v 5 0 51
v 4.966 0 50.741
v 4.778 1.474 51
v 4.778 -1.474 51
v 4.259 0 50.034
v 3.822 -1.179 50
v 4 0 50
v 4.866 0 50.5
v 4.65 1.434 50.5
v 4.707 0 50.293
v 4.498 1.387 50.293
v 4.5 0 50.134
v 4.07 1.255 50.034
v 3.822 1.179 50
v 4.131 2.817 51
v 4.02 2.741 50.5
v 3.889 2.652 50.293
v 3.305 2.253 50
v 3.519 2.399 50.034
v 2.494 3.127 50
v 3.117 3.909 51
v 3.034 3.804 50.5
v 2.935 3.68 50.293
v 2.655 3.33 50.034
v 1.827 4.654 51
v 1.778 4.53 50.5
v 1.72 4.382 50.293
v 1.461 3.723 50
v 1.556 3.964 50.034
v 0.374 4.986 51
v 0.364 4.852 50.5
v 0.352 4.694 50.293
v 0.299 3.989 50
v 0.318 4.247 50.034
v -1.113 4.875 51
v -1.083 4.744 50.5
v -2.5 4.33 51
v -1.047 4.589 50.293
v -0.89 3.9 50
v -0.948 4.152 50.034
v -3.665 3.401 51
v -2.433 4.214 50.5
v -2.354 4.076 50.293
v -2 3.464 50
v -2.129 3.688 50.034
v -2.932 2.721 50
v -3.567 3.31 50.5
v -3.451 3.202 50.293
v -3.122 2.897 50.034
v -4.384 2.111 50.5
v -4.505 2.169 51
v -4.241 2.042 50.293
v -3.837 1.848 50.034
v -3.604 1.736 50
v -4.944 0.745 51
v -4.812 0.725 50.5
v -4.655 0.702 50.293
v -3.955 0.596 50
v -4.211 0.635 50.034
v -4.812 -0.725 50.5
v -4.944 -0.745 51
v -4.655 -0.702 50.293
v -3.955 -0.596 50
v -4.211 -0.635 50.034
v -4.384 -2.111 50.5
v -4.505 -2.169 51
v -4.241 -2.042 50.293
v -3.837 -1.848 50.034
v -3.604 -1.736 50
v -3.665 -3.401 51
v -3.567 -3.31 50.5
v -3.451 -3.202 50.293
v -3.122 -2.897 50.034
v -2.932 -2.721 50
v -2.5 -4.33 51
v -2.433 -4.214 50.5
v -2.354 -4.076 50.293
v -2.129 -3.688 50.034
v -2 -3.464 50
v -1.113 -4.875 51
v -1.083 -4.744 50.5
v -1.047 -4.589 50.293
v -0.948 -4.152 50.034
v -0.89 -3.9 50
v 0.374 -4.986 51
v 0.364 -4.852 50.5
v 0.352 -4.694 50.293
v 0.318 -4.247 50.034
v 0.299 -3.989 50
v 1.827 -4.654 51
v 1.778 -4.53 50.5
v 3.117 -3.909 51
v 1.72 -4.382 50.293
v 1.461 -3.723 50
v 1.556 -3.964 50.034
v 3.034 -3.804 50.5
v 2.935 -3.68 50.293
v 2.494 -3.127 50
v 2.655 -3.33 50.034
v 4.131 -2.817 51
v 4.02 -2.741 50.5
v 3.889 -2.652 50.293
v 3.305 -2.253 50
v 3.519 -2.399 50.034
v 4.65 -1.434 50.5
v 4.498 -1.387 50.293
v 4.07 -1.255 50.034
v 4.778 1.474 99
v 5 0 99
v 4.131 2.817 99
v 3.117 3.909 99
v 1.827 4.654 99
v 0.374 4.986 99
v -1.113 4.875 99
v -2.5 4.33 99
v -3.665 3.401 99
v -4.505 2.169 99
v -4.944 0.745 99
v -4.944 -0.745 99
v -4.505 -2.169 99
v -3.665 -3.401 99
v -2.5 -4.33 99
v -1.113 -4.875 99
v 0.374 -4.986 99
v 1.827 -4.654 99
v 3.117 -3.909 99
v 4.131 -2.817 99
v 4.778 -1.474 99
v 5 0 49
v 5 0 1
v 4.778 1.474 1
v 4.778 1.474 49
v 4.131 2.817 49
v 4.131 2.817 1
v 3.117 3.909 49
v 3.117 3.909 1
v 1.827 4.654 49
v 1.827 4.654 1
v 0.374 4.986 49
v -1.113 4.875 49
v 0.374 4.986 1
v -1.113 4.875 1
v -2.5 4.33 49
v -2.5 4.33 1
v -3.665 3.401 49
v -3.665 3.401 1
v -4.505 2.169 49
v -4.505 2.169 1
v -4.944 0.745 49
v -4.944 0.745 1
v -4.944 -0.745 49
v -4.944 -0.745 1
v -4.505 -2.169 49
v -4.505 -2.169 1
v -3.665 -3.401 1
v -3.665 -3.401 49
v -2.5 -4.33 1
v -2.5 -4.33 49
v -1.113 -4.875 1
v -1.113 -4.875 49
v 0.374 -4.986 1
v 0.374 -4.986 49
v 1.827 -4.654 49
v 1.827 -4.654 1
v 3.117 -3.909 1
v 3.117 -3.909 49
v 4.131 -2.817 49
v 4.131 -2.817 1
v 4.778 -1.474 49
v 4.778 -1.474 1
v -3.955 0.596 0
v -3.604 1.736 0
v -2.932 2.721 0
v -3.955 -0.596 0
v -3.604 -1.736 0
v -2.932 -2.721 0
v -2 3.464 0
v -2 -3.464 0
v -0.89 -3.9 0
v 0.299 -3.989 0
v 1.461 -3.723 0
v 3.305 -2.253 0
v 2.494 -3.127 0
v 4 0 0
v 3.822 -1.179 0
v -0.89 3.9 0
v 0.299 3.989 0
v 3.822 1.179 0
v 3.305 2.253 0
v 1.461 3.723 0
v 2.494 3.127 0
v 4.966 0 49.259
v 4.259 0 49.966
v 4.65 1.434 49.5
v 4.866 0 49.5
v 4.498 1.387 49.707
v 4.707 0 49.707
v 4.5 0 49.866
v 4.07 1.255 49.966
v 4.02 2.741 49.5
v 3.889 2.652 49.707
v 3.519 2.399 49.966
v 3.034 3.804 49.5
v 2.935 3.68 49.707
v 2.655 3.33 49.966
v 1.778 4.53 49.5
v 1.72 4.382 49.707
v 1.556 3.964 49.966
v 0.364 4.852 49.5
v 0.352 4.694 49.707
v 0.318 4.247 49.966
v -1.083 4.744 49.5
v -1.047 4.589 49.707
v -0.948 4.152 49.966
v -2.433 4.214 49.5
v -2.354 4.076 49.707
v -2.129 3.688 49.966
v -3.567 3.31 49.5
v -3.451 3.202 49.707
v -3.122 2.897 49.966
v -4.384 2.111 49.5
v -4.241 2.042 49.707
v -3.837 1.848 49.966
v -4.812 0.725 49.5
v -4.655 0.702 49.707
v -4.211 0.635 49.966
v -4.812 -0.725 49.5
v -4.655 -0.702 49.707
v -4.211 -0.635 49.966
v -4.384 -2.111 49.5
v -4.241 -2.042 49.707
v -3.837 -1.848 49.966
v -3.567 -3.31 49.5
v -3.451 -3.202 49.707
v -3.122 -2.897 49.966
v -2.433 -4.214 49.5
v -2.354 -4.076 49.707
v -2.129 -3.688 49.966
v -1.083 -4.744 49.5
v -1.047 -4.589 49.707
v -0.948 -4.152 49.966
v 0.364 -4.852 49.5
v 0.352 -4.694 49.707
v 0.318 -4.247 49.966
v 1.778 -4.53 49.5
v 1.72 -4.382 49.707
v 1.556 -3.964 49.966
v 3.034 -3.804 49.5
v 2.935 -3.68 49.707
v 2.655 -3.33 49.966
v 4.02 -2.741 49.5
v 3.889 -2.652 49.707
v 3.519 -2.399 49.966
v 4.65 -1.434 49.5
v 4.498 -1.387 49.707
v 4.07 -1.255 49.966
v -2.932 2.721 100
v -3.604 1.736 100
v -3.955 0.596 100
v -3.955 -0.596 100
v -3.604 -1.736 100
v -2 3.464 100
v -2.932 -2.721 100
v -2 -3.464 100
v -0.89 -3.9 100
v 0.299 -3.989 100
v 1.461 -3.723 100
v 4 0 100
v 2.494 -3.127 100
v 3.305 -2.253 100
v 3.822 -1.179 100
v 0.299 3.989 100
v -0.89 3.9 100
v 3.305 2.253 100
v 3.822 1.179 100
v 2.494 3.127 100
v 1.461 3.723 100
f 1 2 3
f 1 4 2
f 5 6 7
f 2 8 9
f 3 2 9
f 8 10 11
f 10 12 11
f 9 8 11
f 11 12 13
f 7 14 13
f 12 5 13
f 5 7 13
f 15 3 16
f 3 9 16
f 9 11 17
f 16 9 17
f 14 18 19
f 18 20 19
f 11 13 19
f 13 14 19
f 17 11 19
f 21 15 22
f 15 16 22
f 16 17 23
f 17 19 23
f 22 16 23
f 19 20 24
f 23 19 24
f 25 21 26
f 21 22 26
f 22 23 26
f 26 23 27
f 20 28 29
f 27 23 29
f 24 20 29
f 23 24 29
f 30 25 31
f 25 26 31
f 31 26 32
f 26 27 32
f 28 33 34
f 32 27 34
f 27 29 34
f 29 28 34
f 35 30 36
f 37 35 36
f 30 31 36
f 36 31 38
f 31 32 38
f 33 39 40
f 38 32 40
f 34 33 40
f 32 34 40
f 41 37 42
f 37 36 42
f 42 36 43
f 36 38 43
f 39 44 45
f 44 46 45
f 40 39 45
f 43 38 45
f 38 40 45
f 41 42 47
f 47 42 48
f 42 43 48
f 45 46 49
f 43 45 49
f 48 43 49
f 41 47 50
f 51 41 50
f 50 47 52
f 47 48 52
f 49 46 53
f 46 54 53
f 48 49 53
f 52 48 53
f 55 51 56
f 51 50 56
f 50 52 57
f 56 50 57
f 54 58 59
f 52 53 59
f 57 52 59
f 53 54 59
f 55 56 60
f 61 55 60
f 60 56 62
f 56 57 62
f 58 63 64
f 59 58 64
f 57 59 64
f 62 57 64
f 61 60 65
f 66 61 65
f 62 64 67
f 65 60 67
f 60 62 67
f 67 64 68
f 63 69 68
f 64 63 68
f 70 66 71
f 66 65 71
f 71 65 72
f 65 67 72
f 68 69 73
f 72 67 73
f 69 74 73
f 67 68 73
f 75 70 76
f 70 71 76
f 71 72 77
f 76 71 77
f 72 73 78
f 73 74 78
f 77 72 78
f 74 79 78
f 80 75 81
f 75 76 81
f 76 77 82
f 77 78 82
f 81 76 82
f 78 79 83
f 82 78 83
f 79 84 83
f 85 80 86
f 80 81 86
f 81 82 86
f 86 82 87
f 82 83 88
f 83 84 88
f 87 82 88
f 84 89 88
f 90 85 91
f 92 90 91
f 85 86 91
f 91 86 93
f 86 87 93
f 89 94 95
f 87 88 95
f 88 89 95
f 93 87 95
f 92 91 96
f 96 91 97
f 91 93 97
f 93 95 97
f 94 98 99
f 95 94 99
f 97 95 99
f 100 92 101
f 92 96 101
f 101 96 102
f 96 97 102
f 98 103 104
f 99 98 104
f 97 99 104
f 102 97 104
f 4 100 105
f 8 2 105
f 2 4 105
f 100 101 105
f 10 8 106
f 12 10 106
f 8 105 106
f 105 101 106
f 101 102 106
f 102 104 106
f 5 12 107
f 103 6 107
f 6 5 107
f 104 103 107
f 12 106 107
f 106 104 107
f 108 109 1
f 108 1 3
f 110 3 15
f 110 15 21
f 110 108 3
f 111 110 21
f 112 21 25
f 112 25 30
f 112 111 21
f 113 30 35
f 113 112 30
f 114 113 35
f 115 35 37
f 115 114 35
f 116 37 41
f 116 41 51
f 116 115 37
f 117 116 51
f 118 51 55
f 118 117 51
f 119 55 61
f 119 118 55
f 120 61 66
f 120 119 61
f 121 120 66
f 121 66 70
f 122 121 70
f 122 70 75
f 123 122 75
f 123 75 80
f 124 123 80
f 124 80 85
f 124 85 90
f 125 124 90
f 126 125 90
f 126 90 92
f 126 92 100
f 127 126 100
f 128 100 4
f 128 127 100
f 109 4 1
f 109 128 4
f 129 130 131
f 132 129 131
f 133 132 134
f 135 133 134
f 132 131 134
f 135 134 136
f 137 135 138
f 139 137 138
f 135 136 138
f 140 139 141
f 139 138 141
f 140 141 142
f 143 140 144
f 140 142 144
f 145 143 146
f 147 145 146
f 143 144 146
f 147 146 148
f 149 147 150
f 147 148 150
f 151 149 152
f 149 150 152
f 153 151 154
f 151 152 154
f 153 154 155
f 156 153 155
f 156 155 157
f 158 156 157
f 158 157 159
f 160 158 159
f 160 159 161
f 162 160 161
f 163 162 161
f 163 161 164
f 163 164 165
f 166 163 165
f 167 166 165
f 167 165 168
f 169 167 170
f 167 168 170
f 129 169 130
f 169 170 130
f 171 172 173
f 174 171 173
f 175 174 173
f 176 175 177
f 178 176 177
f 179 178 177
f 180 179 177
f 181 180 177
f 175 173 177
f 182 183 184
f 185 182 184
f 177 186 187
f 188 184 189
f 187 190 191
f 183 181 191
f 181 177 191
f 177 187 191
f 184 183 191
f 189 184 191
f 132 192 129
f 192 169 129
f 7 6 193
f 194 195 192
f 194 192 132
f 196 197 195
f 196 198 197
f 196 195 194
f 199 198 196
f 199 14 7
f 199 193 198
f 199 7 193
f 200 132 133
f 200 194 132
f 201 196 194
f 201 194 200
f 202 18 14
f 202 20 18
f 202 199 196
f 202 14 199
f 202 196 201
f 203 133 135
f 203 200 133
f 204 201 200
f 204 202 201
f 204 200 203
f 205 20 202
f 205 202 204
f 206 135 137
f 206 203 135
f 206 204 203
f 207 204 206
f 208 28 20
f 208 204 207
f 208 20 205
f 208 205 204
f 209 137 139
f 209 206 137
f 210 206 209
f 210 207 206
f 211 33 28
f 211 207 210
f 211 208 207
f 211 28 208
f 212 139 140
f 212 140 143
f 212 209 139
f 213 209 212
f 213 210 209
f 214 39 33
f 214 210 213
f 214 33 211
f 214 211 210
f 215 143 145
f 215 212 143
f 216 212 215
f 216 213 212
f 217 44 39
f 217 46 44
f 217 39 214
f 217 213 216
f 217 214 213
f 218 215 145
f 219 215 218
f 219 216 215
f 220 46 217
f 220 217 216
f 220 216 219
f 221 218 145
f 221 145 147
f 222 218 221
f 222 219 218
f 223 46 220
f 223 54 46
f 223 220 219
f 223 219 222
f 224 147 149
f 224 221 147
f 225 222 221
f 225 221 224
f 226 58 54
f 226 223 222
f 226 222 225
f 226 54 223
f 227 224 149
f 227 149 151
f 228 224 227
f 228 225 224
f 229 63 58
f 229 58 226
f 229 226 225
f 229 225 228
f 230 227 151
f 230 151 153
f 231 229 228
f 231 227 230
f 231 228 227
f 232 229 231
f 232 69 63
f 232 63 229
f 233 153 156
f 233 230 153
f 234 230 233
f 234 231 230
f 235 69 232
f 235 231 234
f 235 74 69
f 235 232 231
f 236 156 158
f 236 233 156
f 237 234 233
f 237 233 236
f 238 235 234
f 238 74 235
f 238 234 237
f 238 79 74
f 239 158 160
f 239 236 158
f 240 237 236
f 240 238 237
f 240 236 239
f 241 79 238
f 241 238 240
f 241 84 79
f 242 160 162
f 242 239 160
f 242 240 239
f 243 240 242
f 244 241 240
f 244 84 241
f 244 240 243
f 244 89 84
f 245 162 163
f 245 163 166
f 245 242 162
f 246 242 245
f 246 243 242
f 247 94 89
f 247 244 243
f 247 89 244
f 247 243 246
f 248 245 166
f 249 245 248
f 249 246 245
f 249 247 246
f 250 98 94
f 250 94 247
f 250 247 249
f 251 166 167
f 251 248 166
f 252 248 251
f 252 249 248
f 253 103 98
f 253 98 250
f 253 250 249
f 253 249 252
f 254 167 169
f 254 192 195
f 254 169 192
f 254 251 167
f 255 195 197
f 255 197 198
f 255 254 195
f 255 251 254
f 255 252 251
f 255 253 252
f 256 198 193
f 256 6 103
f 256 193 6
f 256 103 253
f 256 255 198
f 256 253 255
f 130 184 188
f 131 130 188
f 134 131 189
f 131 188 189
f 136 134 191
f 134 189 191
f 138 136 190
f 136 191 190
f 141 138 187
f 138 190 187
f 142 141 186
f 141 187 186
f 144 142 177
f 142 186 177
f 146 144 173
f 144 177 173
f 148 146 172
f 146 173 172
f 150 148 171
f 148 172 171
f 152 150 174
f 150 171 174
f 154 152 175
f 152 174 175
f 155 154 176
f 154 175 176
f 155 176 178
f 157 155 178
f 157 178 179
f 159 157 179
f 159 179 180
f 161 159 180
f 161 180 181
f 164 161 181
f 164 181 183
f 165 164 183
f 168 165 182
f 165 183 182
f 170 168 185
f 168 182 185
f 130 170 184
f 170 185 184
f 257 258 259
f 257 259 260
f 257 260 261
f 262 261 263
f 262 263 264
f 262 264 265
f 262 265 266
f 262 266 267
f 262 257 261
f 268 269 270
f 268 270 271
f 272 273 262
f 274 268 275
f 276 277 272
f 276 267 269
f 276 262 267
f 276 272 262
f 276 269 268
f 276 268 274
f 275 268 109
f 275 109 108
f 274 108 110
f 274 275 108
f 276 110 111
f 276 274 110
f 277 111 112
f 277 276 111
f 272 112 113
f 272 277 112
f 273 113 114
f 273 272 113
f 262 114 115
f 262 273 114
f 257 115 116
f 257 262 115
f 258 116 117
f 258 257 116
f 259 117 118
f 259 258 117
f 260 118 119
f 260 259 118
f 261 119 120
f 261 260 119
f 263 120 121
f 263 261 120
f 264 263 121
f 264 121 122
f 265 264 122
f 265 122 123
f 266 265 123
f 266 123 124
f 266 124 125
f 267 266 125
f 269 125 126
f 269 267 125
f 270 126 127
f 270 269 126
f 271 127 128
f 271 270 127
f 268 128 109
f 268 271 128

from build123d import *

# Parameters (mm, degrees)
F0_R     = 5
F1_DEPTH = 50
F2_R     = 1
F3_SIZE  = 1


with BuildPart() as f1:
    # F0 (on Top) → F1 (new body)
    with BuildSketch(Plane.XY):
        Circle(F0_R)
    extrude(amount=F1_DEPTH)

    # F2
    f2_edges = [f1.edges().sort_by_distance(p)[0] for p in [
        (-5, 0, 50),
    ]]
    fillet(f2_edges, radius=F2_R)

    # F3
    f3_edges = [f1.edges().sort_by_distance(p)[0] for p in [
        (-5, 0, 0),
    ]]
    chamfer(f3_edges, length=F3_SIZE)

    # F4: F1 across face


with BuildPart() as f1_1:
    add(f1.part)
    add(f1.part.mirror(Plane.XY.offset(50)))


solid = f1_1.part
